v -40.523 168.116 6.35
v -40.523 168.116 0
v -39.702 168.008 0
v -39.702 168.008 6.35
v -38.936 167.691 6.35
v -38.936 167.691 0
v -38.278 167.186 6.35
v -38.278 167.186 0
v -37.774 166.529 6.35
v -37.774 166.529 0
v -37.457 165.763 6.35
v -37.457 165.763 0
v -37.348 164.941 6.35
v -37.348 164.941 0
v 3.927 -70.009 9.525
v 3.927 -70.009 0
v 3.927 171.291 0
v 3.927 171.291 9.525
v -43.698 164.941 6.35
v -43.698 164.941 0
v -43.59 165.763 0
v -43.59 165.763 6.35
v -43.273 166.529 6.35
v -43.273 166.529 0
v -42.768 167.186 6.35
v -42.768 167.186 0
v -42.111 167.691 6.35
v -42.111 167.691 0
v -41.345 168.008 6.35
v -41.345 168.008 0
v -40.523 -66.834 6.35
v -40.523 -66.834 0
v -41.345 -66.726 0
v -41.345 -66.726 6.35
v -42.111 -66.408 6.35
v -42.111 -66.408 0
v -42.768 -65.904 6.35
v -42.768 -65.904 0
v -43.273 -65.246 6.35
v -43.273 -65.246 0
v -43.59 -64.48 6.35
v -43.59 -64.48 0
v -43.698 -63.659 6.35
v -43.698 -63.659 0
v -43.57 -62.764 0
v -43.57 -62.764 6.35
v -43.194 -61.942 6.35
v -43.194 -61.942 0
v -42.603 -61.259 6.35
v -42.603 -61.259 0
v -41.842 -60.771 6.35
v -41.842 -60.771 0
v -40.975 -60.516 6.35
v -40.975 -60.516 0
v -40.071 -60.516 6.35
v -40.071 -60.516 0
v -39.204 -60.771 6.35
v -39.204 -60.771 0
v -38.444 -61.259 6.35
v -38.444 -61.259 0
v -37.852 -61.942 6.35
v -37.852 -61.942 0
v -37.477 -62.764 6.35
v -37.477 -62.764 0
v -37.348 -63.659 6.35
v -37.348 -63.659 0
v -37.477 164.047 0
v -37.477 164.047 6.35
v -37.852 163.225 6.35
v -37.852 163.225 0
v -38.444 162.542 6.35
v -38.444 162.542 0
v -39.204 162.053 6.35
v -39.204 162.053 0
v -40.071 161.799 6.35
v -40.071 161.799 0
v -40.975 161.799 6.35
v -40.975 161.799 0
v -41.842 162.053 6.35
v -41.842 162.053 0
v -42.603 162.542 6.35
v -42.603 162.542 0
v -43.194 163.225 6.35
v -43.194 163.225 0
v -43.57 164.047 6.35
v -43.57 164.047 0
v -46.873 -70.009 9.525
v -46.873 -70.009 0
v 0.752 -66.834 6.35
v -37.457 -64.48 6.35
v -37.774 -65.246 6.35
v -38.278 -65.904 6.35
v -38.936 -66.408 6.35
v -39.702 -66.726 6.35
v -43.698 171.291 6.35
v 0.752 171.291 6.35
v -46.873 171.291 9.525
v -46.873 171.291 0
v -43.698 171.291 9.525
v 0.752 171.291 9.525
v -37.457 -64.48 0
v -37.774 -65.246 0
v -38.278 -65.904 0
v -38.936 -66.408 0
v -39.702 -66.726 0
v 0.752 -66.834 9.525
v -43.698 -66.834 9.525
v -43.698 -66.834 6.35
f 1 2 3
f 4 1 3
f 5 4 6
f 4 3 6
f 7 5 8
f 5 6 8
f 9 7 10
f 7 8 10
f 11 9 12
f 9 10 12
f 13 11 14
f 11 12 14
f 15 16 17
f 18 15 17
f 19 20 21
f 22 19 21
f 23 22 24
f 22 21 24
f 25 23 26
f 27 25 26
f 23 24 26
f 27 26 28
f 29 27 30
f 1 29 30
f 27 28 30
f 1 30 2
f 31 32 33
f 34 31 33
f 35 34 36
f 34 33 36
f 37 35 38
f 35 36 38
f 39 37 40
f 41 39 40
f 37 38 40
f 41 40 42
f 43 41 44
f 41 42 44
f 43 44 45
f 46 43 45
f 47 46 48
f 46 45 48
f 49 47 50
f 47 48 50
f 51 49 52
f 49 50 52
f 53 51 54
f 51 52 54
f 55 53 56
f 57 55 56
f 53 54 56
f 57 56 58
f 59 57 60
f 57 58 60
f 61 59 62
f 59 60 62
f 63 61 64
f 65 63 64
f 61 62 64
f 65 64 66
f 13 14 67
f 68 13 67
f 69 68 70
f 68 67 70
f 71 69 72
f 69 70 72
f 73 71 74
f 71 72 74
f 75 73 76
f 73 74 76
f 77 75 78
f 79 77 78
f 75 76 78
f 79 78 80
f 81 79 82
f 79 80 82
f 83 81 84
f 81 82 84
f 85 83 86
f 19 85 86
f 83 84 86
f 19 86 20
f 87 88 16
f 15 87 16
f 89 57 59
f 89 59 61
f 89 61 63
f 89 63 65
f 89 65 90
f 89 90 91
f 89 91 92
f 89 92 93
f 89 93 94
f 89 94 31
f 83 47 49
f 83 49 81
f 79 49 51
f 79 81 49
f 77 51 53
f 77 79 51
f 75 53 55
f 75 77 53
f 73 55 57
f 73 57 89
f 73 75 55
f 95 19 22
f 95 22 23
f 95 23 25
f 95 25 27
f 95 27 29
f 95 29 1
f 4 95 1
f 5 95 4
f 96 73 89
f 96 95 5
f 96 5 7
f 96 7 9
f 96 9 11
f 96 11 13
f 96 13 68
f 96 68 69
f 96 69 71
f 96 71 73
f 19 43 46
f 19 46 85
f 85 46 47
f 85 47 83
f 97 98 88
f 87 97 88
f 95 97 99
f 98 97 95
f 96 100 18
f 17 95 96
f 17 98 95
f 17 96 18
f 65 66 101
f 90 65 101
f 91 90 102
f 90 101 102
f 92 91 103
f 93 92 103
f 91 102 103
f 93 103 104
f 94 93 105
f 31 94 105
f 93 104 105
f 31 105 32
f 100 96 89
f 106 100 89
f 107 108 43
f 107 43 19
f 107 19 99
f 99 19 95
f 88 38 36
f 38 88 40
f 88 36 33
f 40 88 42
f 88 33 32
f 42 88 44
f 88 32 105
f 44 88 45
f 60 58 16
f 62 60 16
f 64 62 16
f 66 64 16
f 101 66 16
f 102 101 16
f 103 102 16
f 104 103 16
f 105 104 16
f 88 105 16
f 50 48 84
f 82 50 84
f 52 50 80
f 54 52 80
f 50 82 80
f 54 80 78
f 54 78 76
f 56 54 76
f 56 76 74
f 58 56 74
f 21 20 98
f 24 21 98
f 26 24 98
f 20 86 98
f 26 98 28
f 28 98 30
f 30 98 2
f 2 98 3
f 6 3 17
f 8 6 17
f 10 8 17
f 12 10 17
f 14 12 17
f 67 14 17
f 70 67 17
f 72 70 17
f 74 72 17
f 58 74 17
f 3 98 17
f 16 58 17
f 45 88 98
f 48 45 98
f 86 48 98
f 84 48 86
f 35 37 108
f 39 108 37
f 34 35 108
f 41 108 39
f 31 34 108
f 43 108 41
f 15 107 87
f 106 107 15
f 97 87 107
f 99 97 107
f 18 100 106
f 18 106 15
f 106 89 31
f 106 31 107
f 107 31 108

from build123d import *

# Parameters (mm, degrees)
F0_W     = 3.175
F0_H     = 3.175
F0_H_2   = 234.95
F1_DEPTH = 9.525
F2_DEPTH = 6.35
F3_DEPTH = 6.35


with BuildPart() as f1:
    # F0 (on Top) → F1 (new body)
    with BuildSketch(Plane.XY):
        with Locations((-45.285827, 169.703753)):
            Rectangle(F0_W, F0_H)
        Polygon((-43.698327, 168.116253), (-46.873327, 168.116253), (-46.873327, 158.591253), (-46.873327, -57.308747), (-46.873327, -66.833747), (-43.698327, -66.833747), (-43.698327, -63.658747), (-43.698327, 164.941253), align=None)
        with Locations((2.339173, 169.703753)):
            Rectangle(F0_W, F0_H)
        with Locations((2.339173, 50.641253)):
            Rectangle(F0_W, F0_H_2)
        with Locations((-45.285827, -68.421247)):
            Rectangle(F0_W, F0_H)
        Polygon((0.751673, -70.008747), (0.751673, -66.833747), (-40.523327, -66.833747), (-43.698327, -66.833747), (-43.698327, -70.008747), (-34.173327, -70.008747), align=None)
        with Locations((2.339173, -68.421247)):
            Rectangle(F0_W, F0_H)
    extrude(amount=F1_DEPTH)

    # F0 (on Top) → F2 (join)
    with BuildSketch(Plane.XY):
        with BuildLine():
            ThreePointArc((-37.348327, 164.941253), (-40.523327, 161.766253), (-43.698327, 164.941253))
            Line((-43.698327, 164.941253), (-43.698327, -63.658747))
            ThreePointArc((-43.698327, -63.658747), (-40.523327, -60.483747), (-37.348327, -63.658747))
            ThreePointArc((-37.348327, -63.658747), (-38.278263, -65.903811), (-40.523327, -66.833747))
            Line((-40.523327, -66.833747), (0.751673, -66.833747))
            Line((0.751673, -66.833747), (0.751673, 168.116253))
            Line((0.751673, 168.116253), (-40.523327, 168.116253))
            ThreePointArc((-40.523327, 168.116253), (-38.278263, 167.186317), (-37.348327, 164.941253))
        make_face()
        Polygon((-34.173327, 171.291253), (-43.698327, 171.291253), (-43.698327, 168.116253), (-40.523327, 168.116253), (0.751673, 168.116253), (0.751673, 171.291253), align=None)
    extrude(amount=F2_DEPTH)

    # F0 (on Top) → F3 (join)
    with BuildSketch(Plane.XY):
        with BuildLine():
            Line((-40.523327, 168.116253), (-43.698327, 168.116253))
            Line((-43.698327, 168.116253), (-43.698327, 164.941253))
            ThreePointArc((-43.698327, 164.941253), (-42.768391, 167.186317), (-40.523327, 168.116253))
        make_face()
        with BuildLine():
            ThreePointArc((-40.523327, -66.833747), (-42.768391, -65.903811), (-43.698327, -63.658747))
            Line((-43.698327, -63.658747), (-43.698327, -66.833747))
            Line((-43.698327, -66.833747), (-40.523327, -66.833747))
        make_face()
    extrude(amount=F3_DEPTH)


solid = f1.part
